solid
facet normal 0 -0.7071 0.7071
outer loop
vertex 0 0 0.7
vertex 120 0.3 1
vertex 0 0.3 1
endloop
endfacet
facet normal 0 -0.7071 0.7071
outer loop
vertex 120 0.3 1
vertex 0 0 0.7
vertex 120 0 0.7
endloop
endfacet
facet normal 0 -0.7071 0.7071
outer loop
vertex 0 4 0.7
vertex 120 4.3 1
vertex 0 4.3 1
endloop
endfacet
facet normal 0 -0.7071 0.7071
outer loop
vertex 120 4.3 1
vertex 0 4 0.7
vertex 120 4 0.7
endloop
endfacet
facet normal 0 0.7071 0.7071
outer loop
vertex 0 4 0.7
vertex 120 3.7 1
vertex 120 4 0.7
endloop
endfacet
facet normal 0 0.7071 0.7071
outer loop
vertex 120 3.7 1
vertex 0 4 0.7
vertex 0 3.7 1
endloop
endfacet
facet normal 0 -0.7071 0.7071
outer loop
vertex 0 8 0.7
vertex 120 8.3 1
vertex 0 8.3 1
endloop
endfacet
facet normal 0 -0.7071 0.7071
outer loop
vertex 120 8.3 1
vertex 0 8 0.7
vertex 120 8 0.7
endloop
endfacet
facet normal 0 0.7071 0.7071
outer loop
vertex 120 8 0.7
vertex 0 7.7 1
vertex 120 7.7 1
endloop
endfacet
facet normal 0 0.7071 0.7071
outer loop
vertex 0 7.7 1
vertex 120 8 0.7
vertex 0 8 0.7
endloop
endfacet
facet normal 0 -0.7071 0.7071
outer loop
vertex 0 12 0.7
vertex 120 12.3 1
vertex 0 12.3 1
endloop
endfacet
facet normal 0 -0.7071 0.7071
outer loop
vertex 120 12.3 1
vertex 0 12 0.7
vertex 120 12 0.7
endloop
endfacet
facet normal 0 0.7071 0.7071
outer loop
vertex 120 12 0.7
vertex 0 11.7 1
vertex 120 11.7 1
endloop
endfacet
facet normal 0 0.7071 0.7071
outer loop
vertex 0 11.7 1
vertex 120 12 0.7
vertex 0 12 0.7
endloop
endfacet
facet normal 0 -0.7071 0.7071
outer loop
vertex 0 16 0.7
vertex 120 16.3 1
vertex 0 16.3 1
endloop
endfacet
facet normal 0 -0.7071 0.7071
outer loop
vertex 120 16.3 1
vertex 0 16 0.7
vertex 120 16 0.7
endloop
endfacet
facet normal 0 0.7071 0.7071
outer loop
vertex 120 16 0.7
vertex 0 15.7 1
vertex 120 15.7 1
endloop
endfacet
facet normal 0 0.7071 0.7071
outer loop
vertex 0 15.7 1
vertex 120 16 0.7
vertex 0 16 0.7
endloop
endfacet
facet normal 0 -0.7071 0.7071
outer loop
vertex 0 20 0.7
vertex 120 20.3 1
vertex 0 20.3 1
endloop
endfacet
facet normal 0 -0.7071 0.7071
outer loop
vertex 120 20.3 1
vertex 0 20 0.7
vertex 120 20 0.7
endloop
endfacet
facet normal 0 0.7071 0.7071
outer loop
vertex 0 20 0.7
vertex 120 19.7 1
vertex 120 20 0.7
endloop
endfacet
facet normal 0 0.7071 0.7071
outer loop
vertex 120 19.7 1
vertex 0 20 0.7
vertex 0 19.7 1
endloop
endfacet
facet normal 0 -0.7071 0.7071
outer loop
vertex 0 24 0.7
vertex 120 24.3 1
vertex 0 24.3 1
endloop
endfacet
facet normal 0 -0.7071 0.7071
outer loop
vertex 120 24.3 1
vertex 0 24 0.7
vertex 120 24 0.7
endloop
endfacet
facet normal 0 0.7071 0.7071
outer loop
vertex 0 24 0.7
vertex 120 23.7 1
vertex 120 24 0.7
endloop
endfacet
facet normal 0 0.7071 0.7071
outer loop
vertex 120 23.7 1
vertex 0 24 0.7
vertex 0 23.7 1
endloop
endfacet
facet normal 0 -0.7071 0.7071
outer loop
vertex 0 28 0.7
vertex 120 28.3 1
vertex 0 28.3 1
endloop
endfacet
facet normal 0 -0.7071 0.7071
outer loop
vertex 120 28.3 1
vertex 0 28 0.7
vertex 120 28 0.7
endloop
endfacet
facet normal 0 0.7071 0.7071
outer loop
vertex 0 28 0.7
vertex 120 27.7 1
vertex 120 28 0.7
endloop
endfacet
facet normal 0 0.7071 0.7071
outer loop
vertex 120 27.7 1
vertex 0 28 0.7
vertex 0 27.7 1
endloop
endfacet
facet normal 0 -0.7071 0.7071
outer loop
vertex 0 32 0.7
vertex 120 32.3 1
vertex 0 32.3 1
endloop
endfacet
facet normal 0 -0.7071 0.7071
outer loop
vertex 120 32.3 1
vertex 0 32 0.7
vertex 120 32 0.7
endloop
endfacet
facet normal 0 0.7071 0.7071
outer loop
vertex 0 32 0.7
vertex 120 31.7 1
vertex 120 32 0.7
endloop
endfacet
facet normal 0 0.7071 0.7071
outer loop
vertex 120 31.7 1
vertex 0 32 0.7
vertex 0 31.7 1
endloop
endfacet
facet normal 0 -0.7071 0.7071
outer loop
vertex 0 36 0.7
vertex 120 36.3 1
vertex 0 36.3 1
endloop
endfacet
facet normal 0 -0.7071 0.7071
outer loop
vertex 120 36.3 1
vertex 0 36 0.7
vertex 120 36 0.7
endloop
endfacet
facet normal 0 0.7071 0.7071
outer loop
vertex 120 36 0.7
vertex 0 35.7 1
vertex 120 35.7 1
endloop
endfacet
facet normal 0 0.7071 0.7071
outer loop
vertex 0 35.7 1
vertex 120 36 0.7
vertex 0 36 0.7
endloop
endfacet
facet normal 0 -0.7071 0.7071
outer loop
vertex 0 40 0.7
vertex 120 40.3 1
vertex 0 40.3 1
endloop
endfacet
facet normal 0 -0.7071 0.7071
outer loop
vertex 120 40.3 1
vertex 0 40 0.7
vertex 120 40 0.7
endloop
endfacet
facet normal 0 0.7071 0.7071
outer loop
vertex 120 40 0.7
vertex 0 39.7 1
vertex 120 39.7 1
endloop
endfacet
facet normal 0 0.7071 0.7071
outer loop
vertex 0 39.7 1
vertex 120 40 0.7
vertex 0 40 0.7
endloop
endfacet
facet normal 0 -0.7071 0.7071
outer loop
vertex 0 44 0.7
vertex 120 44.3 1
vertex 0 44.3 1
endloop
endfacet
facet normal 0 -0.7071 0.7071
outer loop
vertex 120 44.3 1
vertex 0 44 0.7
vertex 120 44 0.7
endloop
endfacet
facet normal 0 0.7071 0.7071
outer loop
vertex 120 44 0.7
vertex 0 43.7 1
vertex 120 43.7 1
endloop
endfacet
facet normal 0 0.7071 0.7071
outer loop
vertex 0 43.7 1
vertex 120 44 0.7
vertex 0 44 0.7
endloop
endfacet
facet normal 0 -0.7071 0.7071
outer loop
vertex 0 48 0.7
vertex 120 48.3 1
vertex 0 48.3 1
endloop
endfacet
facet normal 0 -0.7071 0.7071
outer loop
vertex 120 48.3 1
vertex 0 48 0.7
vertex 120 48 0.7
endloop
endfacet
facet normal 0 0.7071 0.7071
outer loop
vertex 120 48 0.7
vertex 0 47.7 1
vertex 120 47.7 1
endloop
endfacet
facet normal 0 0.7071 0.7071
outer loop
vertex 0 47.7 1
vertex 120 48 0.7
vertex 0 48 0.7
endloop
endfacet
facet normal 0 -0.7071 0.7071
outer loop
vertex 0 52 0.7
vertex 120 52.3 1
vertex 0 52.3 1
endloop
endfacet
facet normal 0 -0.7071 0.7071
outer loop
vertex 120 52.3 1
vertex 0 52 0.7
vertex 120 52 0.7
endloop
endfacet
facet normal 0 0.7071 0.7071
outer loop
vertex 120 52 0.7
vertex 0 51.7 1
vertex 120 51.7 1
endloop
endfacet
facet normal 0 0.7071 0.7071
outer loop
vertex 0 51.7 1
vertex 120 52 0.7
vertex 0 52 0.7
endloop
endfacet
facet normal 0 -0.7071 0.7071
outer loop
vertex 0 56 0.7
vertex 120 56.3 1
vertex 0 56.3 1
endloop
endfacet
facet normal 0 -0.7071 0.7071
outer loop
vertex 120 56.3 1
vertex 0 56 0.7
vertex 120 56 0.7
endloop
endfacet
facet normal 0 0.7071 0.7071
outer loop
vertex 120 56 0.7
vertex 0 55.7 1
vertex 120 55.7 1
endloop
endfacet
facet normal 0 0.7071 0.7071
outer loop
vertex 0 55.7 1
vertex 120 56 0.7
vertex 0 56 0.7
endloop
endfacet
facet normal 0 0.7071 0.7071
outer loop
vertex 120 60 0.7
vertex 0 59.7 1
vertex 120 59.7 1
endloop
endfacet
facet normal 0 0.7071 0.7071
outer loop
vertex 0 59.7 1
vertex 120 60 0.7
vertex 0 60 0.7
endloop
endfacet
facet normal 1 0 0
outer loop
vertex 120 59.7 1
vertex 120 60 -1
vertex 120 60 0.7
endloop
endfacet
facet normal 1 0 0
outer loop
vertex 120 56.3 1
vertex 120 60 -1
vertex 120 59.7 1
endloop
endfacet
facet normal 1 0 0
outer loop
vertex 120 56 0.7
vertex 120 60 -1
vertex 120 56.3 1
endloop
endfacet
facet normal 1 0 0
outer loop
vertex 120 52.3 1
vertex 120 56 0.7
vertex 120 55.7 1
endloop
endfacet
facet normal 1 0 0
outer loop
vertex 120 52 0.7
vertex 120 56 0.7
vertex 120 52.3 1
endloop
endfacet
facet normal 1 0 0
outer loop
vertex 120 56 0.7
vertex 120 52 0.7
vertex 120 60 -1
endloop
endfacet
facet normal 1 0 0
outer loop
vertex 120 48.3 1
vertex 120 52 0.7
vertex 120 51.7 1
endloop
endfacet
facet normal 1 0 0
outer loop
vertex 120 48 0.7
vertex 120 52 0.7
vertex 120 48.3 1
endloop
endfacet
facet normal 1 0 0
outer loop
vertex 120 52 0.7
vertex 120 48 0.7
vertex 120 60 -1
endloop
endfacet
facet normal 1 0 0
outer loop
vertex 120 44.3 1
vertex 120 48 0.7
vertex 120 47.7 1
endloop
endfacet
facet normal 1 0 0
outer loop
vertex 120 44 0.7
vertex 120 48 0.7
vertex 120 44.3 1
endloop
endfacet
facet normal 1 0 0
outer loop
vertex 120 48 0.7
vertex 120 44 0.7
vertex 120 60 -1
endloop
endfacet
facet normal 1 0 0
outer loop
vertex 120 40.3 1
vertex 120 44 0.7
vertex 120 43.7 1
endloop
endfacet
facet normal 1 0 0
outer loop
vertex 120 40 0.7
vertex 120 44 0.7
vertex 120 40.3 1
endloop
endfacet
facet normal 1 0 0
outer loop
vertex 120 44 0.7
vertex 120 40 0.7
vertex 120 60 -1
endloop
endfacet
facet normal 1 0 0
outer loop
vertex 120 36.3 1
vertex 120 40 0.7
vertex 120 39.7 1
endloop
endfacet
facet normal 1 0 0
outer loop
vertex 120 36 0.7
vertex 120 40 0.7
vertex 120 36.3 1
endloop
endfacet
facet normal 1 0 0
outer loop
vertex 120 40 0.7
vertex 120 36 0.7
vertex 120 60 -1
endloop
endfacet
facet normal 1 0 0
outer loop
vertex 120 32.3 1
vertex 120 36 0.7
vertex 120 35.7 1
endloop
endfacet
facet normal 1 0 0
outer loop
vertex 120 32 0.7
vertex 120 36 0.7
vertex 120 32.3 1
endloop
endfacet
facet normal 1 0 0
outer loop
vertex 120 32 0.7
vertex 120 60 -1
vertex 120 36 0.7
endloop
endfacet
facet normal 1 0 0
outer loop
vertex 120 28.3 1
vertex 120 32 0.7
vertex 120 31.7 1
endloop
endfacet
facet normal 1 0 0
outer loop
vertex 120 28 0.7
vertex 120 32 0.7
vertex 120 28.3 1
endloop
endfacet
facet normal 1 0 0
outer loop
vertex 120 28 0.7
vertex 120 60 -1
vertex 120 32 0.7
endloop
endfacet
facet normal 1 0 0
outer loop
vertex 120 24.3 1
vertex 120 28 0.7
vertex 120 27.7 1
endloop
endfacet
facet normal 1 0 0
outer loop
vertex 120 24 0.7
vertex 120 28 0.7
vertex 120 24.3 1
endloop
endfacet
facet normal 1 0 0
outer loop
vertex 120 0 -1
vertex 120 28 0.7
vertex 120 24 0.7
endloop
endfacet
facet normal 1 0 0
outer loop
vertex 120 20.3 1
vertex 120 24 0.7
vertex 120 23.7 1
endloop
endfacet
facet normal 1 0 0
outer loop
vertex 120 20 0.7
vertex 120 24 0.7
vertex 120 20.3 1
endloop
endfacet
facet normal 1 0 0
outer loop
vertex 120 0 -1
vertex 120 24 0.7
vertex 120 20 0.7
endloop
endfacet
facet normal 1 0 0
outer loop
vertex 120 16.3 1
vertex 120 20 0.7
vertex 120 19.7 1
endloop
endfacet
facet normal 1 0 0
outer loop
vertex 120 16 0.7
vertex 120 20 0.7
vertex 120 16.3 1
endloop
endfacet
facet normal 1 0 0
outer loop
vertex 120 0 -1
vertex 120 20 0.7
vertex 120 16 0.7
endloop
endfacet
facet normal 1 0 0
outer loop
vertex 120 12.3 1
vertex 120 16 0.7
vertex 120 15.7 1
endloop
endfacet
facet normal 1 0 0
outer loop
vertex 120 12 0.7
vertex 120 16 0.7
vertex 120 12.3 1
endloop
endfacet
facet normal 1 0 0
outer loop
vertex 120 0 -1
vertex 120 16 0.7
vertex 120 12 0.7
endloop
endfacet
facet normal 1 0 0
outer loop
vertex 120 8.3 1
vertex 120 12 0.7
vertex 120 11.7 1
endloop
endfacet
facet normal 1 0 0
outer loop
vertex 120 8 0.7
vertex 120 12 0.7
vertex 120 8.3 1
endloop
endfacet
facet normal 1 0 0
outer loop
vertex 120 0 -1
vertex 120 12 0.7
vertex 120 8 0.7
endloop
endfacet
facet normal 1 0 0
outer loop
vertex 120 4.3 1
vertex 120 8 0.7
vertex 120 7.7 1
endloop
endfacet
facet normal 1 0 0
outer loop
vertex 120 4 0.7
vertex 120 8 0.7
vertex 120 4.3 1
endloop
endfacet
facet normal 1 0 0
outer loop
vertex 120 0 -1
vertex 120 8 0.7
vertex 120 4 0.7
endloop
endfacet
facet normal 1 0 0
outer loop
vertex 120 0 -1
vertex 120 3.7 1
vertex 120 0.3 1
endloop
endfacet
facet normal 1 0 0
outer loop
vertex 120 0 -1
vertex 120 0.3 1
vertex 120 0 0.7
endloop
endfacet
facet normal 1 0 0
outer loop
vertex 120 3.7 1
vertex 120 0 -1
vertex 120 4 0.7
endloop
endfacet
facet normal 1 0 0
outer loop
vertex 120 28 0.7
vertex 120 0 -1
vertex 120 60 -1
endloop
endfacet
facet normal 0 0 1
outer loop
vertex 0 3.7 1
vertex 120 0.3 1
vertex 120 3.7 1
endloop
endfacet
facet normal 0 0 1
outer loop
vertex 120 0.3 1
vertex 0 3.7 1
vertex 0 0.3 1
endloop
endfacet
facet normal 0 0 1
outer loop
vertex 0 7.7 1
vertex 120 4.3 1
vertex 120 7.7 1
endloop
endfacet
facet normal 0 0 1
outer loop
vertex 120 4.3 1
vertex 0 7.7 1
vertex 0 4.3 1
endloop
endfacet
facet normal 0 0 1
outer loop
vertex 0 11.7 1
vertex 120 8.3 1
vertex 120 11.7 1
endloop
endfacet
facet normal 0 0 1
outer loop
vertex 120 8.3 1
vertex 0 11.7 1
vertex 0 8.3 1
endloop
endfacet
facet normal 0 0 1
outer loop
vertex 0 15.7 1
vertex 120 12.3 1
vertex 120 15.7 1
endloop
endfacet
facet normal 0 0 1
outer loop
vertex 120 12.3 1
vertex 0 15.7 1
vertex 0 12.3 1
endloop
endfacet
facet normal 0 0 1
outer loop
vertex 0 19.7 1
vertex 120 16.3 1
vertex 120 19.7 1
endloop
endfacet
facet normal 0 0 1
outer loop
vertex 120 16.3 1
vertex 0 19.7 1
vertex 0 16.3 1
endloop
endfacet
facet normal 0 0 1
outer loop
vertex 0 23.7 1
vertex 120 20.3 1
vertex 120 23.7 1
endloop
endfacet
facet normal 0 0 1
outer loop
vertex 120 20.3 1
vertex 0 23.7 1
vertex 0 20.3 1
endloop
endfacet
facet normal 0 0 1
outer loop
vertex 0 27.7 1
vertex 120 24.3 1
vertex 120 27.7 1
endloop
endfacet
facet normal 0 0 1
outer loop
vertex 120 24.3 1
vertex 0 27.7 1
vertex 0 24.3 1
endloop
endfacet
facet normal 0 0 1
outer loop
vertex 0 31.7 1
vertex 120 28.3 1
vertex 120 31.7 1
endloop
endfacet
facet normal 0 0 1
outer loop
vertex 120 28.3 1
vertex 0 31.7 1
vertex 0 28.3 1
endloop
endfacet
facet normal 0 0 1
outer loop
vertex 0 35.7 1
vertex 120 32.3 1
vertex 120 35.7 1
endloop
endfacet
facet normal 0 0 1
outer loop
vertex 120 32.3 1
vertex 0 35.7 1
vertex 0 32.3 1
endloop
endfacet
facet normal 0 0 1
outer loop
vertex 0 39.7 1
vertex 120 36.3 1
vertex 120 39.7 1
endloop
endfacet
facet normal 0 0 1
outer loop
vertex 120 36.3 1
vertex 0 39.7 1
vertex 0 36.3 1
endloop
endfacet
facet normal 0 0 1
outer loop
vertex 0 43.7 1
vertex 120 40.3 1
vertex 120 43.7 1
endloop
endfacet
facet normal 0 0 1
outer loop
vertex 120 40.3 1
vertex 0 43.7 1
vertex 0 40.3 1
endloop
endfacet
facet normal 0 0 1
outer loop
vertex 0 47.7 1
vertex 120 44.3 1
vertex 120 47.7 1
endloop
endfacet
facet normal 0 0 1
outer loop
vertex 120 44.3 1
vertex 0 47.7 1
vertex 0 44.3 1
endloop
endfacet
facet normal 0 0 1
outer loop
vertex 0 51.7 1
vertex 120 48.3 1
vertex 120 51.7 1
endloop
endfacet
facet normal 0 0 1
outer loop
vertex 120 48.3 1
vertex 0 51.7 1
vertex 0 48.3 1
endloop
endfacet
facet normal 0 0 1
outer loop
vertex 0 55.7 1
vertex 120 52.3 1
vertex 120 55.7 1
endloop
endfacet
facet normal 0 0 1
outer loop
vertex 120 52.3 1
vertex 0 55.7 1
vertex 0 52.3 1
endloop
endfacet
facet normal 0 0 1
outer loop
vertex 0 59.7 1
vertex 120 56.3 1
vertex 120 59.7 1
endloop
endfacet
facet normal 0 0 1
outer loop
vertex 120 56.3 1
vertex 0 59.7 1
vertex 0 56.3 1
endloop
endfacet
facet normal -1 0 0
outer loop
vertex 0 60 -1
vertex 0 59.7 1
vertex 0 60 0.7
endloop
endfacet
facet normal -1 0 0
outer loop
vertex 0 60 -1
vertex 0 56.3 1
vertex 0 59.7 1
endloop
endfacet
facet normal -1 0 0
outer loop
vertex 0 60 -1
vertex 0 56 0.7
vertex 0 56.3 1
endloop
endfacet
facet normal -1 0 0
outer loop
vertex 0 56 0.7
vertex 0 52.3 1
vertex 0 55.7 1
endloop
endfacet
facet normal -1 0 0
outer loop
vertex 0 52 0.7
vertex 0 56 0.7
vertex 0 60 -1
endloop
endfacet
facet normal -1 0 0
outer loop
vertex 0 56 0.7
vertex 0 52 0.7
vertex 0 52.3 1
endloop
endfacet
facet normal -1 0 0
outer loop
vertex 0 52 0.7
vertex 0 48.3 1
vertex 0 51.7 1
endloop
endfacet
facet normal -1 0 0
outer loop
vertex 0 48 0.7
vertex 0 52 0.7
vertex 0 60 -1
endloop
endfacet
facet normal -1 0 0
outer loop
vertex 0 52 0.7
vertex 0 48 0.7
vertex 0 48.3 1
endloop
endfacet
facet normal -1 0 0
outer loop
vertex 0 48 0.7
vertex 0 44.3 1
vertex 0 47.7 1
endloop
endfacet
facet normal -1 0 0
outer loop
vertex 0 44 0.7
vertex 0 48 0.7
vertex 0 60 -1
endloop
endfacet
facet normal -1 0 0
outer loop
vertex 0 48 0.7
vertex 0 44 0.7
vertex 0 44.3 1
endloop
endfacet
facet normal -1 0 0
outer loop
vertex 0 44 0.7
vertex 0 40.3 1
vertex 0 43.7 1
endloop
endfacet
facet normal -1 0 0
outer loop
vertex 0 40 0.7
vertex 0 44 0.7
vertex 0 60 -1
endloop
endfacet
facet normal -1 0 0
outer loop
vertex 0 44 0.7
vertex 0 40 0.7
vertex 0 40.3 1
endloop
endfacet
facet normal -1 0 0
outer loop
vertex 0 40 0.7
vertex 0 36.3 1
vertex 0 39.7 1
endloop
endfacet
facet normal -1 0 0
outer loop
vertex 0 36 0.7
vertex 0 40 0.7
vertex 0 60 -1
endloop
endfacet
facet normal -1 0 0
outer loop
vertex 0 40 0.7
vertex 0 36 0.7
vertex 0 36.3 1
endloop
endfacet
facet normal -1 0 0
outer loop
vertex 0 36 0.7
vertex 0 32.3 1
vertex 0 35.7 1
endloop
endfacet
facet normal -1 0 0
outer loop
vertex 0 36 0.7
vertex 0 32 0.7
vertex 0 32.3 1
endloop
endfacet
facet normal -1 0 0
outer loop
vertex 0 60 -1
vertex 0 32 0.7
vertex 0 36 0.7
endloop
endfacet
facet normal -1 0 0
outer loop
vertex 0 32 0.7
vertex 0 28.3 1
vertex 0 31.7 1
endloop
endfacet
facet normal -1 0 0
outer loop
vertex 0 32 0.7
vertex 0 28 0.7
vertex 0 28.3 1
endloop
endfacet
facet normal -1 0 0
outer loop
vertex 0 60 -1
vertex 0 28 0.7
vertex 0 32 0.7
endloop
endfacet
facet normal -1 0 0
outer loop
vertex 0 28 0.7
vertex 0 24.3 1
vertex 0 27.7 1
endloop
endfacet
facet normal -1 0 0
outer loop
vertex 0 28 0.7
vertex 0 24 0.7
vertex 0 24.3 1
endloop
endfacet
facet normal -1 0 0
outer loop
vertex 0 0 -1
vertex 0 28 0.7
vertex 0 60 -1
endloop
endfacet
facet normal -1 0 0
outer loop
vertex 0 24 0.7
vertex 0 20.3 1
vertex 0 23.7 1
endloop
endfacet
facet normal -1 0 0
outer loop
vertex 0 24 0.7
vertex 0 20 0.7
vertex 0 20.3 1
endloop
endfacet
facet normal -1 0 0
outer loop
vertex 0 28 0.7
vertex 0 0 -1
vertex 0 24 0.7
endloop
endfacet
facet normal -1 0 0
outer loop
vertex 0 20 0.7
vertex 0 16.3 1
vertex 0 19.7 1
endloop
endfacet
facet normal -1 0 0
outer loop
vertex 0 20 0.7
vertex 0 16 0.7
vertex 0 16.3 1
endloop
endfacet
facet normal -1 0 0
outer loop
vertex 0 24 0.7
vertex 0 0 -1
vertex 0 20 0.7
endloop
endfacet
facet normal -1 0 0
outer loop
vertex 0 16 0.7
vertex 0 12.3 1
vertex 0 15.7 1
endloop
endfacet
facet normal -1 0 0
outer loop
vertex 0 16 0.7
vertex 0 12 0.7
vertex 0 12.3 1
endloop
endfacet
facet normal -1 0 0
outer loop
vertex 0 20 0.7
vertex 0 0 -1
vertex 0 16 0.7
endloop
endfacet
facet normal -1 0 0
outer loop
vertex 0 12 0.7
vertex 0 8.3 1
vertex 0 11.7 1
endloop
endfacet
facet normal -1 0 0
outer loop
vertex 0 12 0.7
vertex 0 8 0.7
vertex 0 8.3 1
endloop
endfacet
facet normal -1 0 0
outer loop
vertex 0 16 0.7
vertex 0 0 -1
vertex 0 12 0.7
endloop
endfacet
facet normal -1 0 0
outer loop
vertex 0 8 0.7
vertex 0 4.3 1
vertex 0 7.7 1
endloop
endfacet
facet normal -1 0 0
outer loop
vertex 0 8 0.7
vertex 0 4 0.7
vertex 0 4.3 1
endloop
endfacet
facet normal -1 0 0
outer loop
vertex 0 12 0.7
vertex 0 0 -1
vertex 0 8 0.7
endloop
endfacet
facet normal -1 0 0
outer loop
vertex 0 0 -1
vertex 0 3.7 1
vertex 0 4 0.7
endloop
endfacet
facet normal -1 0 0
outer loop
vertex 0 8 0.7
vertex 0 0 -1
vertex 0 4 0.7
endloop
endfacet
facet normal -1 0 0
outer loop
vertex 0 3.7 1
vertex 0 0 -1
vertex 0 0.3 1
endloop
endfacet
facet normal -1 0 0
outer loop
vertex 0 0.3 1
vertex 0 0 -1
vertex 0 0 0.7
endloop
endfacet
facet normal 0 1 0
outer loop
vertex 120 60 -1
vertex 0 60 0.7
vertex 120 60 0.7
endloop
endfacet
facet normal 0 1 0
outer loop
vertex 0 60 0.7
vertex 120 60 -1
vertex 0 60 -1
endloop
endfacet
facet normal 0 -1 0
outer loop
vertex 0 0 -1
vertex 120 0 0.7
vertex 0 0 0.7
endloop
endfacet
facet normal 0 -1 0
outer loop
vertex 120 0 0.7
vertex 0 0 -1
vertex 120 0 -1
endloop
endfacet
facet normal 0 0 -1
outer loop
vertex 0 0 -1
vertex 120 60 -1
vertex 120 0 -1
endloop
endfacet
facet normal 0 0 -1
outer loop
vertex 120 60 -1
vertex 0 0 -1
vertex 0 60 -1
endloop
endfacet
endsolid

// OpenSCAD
/* clapboard - makes clapboard walls

Usage:
	use <path/to/siding.scad>
	...
	clapboard(
		width=10, //how wide, in units
		height=5, //how tall, in boards
		boardwidth=1, //individual board width
		boardthickness=0.1, //individual board thickness
		pitch=5, //angle of board pitch, in degrees
	);
	
The numbers given above are the defaults if you just do
clapboard();  define them to suit your scale and clapboard style.

This module just presents the clapboard planks; to make a 
complete wall with a smooth back, union it with a cube of 
the width, height, and boardwidth of the clapboard pattern.
The example use code at the bottom of this file demonstrates this;
uncomment the cube() line by removing the two forward slashes 
(//).
	
To use in other programs, create your clapboard pattern in the 
required dimensions and export as a .STL file.  Note that
this will lose the color definition.

*/

module clapboard(width=10, height=5, boardwidth=1, boardthickness=0.1, pitch=5)
{
	for (board = [0:1:height-1]) // number of boards, given by height
		translate ([0,board*boardwidth,0]) rotate([-pitch,0,0]) cube ([width, boardwidth, boardthickness]);
	
}

/* planksiding_old - makes plank walls

Usage:
	use <path/to/siding.scad>
	...
	planksiding(
		width=10, //how wide, in units
		height=5, //how tall, in boards
		boardwidth=1, //individual board width
		boardthickness=0.1, //individual board thickness
		notch=0.4,  //depth of the notch in the board interfaces,
					// 0=no notch, 1=notch is full depth of board.
	);
	
The numbers given above are the defaults if you just do
planksiding();  define them to suit your scale and clapboard 
style.
	
To use in other programs, create your planksiding in the 
required dimensions and export as a .STL file.  Note that
this will lose the color definition.

*/

module planksiding_old(width=10, height=5, boardwidth=1, boardthickness=0.1, notch=0.4)
{	
	difference() {
		cube([width, height*boardwidth, boardthickness]);
		union() {
			for (board = [0:1:height])
				translate ([-width/2,board*boardwidth,boardthickness-(boardthickness * notch)]) 
					rotate([45,0,0]) cube (size=[width*2, boardthickness*3, boardthickness*3]);
		}
	}
}


/* planksiding - makes plank walls

Usage:
	use <path/to/siding.scad>
	...
	planksiding(
		width=10, //how wide, in units
		height=5, //how tall, in units
		boardwidth=4, //individual board width
		boardthickness=1, //individual board thickness
		notch=0.3,  //depth of the notch in the board interfaces,
					// 0=no notch, 1=notch is full depth of board.
	);
	
The numbers given above are the defaults if you just do
planksiding();  define them to suit your scale and clapboard 
style.
	
To use in other programs, create your planksiding in the 
required dimensions and export as a .STL file.

*/


module planksiding(width=10*12, height=5*12, boardwidth=4, boardthickness=1, notch=0.3, wallthickness=1)
{	
	difference() {
		cube([width, height, boardthickness]);
		union() {
			for (board = [0:1:height/boardwidth])
				translate ([-width/2,board*boardwidth,boardthickness-(boardthickness * notch)]) 
					rotate([45,0,0]) cube (size=[width*2, boardthickness*3, boardthickness*3]);
		}
	}
	translate([0,0,-wallthickness]) cube([width, height, wallthickness]);
}

//clapboard();
planksiding();
